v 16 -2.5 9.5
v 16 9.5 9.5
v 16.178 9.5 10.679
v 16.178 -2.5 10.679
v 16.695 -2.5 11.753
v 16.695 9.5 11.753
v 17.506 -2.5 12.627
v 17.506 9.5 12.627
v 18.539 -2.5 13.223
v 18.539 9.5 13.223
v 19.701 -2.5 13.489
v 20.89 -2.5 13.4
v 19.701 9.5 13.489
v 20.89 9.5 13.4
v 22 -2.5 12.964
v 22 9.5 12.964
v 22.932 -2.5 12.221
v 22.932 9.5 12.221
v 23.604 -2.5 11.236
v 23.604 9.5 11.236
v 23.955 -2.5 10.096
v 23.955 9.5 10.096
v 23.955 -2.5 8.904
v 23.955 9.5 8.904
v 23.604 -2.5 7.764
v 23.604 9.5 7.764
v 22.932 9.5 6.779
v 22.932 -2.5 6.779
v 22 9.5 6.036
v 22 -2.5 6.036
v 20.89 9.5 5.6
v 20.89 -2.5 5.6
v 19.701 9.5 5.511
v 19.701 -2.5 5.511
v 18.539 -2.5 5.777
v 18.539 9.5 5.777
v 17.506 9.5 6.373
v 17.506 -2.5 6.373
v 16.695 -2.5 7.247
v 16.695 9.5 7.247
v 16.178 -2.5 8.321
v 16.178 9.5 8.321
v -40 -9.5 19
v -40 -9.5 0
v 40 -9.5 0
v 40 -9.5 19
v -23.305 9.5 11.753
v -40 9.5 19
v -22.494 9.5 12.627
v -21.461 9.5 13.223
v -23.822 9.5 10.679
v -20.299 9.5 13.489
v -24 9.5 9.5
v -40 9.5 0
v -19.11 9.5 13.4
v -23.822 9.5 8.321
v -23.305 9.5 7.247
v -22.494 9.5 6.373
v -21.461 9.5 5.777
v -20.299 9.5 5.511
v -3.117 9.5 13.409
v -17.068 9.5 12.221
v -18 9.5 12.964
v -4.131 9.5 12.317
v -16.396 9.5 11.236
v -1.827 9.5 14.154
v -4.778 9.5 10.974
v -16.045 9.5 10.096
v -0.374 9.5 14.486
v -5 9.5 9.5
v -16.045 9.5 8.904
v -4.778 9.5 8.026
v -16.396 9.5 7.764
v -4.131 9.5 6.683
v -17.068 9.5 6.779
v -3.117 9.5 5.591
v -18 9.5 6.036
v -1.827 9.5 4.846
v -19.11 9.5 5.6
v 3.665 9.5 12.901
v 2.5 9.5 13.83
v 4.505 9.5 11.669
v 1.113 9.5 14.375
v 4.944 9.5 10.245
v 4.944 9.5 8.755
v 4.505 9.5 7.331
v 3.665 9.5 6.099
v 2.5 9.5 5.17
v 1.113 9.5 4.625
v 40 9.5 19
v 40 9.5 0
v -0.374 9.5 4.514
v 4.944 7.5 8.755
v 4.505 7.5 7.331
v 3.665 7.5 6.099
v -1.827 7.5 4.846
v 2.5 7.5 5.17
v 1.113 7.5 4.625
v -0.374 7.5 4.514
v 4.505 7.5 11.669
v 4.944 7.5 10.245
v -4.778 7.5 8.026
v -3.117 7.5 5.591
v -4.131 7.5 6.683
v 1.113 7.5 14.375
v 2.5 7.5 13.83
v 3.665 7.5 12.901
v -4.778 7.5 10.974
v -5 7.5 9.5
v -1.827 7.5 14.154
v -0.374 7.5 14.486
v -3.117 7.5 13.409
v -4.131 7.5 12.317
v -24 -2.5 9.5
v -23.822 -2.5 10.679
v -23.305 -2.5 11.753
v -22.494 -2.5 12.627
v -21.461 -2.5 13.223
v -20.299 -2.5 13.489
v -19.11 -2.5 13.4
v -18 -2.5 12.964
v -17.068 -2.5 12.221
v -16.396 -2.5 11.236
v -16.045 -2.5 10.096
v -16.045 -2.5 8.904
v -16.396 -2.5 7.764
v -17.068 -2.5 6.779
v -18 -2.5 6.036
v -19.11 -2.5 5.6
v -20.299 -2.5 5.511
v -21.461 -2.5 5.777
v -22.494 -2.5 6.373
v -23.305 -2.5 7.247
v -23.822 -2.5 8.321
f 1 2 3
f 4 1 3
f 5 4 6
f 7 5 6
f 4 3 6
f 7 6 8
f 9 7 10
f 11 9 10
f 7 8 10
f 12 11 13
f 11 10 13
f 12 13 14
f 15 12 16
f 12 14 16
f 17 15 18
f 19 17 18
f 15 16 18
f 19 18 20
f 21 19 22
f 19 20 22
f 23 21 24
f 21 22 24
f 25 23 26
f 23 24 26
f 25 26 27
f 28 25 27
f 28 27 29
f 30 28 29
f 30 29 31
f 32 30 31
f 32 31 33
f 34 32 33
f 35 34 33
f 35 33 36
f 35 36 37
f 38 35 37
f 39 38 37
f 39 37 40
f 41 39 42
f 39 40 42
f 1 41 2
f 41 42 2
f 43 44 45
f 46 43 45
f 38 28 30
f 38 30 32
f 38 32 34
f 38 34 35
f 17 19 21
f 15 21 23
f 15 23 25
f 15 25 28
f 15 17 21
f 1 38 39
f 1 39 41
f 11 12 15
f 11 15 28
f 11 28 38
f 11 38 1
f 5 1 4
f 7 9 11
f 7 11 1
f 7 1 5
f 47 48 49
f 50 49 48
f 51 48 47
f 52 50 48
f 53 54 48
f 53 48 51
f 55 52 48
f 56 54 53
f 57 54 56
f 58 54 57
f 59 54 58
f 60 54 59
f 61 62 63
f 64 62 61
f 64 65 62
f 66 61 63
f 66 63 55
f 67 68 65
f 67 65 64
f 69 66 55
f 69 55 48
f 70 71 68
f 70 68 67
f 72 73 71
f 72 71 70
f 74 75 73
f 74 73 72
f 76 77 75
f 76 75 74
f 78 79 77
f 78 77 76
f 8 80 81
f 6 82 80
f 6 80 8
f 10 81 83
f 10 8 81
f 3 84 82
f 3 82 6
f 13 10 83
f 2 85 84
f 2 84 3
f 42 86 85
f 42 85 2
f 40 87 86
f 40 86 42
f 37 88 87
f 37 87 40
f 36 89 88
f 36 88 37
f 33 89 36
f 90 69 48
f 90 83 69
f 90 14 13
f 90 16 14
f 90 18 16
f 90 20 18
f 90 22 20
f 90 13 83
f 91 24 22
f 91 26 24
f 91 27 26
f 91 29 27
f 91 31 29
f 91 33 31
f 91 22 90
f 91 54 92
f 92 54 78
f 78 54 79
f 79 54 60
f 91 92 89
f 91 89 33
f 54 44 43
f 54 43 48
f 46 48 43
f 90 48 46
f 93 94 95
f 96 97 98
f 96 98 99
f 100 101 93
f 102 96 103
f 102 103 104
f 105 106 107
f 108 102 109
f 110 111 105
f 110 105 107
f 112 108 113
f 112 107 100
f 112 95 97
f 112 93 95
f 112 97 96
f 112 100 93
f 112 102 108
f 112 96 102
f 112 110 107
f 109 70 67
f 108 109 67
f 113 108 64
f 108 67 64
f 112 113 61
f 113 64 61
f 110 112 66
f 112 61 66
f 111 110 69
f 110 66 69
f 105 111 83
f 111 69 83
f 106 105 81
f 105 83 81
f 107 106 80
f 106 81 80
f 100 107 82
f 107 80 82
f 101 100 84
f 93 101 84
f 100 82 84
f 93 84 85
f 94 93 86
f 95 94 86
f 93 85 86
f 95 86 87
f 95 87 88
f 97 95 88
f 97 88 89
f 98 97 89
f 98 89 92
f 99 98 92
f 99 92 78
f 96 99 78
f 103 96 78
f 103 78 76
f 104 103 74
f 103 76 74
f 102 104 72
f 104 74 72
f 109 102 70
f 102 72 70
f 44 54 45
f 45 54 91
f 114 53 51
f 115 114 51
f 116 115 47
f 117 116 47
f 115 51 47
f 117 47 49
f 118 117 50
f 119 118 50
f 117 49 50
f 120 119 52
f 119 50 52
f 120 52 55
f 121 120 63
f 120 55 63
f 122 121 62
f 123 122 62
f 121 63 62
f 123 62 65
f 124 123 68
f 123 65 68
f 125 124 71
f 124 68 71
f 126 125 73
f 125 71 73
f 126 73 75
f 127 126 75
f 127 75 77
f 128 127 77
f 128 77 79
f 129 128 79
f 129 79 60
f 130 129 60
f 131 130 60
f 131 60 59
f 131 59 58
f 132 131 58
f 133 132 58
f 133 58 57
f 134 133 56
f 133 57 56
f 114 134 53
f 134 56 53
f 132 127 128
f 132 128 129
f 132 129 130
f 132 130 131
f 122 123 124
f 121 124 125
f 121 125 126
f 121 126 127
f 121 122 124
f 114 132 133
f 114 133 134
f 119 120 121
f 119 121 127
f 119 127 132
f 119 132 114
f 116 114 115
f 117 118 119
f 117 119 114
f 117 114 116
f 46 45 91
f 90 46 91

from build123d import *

# Parameters (mm, degrees)
F0_W     = 80
F0_H     = 19
F1_DEPTH = 19
F2_R     = 4
F3_DEPTH = 12
F2_R_2   = 5
F4_DEPTH = 2


with BuildPart() as f1:
    # F0 (on Top) → F1 (new body)
    with BuildSketch(Plane.XY):
        Rectangle(F0_W, F0_H)
    extrude(amount=F1_DEPTH)

    # F2 (on face) → F3 (cut)
    with BuildSketch(Plane(origin=(0, 9.5, 0), x_dir=(-1, 0, 0), z_dir=(0, 1, 0))):
        with Locations((20, 9.5)):
            Circle(F2_R)
        with Locations((-20, 9.5)):
            Circle(F2_R)
    extrude(amount=-F3_DEPTH, mode=Mode.SUBTRACT)

    # F2 (on face) → F4 (cut)
    with BuildSketch(Plane(origin=(0, 9.5, 0), x_dir=(-1, 0, 0), z_dir=(0, 1, 0))):
        with Locations((0, 9.5)):
            Circle(F2_R_2)
    extrude(amount=-F4_DEPTH, mode=Mode.SUBTRACT)


solid = f1.part
